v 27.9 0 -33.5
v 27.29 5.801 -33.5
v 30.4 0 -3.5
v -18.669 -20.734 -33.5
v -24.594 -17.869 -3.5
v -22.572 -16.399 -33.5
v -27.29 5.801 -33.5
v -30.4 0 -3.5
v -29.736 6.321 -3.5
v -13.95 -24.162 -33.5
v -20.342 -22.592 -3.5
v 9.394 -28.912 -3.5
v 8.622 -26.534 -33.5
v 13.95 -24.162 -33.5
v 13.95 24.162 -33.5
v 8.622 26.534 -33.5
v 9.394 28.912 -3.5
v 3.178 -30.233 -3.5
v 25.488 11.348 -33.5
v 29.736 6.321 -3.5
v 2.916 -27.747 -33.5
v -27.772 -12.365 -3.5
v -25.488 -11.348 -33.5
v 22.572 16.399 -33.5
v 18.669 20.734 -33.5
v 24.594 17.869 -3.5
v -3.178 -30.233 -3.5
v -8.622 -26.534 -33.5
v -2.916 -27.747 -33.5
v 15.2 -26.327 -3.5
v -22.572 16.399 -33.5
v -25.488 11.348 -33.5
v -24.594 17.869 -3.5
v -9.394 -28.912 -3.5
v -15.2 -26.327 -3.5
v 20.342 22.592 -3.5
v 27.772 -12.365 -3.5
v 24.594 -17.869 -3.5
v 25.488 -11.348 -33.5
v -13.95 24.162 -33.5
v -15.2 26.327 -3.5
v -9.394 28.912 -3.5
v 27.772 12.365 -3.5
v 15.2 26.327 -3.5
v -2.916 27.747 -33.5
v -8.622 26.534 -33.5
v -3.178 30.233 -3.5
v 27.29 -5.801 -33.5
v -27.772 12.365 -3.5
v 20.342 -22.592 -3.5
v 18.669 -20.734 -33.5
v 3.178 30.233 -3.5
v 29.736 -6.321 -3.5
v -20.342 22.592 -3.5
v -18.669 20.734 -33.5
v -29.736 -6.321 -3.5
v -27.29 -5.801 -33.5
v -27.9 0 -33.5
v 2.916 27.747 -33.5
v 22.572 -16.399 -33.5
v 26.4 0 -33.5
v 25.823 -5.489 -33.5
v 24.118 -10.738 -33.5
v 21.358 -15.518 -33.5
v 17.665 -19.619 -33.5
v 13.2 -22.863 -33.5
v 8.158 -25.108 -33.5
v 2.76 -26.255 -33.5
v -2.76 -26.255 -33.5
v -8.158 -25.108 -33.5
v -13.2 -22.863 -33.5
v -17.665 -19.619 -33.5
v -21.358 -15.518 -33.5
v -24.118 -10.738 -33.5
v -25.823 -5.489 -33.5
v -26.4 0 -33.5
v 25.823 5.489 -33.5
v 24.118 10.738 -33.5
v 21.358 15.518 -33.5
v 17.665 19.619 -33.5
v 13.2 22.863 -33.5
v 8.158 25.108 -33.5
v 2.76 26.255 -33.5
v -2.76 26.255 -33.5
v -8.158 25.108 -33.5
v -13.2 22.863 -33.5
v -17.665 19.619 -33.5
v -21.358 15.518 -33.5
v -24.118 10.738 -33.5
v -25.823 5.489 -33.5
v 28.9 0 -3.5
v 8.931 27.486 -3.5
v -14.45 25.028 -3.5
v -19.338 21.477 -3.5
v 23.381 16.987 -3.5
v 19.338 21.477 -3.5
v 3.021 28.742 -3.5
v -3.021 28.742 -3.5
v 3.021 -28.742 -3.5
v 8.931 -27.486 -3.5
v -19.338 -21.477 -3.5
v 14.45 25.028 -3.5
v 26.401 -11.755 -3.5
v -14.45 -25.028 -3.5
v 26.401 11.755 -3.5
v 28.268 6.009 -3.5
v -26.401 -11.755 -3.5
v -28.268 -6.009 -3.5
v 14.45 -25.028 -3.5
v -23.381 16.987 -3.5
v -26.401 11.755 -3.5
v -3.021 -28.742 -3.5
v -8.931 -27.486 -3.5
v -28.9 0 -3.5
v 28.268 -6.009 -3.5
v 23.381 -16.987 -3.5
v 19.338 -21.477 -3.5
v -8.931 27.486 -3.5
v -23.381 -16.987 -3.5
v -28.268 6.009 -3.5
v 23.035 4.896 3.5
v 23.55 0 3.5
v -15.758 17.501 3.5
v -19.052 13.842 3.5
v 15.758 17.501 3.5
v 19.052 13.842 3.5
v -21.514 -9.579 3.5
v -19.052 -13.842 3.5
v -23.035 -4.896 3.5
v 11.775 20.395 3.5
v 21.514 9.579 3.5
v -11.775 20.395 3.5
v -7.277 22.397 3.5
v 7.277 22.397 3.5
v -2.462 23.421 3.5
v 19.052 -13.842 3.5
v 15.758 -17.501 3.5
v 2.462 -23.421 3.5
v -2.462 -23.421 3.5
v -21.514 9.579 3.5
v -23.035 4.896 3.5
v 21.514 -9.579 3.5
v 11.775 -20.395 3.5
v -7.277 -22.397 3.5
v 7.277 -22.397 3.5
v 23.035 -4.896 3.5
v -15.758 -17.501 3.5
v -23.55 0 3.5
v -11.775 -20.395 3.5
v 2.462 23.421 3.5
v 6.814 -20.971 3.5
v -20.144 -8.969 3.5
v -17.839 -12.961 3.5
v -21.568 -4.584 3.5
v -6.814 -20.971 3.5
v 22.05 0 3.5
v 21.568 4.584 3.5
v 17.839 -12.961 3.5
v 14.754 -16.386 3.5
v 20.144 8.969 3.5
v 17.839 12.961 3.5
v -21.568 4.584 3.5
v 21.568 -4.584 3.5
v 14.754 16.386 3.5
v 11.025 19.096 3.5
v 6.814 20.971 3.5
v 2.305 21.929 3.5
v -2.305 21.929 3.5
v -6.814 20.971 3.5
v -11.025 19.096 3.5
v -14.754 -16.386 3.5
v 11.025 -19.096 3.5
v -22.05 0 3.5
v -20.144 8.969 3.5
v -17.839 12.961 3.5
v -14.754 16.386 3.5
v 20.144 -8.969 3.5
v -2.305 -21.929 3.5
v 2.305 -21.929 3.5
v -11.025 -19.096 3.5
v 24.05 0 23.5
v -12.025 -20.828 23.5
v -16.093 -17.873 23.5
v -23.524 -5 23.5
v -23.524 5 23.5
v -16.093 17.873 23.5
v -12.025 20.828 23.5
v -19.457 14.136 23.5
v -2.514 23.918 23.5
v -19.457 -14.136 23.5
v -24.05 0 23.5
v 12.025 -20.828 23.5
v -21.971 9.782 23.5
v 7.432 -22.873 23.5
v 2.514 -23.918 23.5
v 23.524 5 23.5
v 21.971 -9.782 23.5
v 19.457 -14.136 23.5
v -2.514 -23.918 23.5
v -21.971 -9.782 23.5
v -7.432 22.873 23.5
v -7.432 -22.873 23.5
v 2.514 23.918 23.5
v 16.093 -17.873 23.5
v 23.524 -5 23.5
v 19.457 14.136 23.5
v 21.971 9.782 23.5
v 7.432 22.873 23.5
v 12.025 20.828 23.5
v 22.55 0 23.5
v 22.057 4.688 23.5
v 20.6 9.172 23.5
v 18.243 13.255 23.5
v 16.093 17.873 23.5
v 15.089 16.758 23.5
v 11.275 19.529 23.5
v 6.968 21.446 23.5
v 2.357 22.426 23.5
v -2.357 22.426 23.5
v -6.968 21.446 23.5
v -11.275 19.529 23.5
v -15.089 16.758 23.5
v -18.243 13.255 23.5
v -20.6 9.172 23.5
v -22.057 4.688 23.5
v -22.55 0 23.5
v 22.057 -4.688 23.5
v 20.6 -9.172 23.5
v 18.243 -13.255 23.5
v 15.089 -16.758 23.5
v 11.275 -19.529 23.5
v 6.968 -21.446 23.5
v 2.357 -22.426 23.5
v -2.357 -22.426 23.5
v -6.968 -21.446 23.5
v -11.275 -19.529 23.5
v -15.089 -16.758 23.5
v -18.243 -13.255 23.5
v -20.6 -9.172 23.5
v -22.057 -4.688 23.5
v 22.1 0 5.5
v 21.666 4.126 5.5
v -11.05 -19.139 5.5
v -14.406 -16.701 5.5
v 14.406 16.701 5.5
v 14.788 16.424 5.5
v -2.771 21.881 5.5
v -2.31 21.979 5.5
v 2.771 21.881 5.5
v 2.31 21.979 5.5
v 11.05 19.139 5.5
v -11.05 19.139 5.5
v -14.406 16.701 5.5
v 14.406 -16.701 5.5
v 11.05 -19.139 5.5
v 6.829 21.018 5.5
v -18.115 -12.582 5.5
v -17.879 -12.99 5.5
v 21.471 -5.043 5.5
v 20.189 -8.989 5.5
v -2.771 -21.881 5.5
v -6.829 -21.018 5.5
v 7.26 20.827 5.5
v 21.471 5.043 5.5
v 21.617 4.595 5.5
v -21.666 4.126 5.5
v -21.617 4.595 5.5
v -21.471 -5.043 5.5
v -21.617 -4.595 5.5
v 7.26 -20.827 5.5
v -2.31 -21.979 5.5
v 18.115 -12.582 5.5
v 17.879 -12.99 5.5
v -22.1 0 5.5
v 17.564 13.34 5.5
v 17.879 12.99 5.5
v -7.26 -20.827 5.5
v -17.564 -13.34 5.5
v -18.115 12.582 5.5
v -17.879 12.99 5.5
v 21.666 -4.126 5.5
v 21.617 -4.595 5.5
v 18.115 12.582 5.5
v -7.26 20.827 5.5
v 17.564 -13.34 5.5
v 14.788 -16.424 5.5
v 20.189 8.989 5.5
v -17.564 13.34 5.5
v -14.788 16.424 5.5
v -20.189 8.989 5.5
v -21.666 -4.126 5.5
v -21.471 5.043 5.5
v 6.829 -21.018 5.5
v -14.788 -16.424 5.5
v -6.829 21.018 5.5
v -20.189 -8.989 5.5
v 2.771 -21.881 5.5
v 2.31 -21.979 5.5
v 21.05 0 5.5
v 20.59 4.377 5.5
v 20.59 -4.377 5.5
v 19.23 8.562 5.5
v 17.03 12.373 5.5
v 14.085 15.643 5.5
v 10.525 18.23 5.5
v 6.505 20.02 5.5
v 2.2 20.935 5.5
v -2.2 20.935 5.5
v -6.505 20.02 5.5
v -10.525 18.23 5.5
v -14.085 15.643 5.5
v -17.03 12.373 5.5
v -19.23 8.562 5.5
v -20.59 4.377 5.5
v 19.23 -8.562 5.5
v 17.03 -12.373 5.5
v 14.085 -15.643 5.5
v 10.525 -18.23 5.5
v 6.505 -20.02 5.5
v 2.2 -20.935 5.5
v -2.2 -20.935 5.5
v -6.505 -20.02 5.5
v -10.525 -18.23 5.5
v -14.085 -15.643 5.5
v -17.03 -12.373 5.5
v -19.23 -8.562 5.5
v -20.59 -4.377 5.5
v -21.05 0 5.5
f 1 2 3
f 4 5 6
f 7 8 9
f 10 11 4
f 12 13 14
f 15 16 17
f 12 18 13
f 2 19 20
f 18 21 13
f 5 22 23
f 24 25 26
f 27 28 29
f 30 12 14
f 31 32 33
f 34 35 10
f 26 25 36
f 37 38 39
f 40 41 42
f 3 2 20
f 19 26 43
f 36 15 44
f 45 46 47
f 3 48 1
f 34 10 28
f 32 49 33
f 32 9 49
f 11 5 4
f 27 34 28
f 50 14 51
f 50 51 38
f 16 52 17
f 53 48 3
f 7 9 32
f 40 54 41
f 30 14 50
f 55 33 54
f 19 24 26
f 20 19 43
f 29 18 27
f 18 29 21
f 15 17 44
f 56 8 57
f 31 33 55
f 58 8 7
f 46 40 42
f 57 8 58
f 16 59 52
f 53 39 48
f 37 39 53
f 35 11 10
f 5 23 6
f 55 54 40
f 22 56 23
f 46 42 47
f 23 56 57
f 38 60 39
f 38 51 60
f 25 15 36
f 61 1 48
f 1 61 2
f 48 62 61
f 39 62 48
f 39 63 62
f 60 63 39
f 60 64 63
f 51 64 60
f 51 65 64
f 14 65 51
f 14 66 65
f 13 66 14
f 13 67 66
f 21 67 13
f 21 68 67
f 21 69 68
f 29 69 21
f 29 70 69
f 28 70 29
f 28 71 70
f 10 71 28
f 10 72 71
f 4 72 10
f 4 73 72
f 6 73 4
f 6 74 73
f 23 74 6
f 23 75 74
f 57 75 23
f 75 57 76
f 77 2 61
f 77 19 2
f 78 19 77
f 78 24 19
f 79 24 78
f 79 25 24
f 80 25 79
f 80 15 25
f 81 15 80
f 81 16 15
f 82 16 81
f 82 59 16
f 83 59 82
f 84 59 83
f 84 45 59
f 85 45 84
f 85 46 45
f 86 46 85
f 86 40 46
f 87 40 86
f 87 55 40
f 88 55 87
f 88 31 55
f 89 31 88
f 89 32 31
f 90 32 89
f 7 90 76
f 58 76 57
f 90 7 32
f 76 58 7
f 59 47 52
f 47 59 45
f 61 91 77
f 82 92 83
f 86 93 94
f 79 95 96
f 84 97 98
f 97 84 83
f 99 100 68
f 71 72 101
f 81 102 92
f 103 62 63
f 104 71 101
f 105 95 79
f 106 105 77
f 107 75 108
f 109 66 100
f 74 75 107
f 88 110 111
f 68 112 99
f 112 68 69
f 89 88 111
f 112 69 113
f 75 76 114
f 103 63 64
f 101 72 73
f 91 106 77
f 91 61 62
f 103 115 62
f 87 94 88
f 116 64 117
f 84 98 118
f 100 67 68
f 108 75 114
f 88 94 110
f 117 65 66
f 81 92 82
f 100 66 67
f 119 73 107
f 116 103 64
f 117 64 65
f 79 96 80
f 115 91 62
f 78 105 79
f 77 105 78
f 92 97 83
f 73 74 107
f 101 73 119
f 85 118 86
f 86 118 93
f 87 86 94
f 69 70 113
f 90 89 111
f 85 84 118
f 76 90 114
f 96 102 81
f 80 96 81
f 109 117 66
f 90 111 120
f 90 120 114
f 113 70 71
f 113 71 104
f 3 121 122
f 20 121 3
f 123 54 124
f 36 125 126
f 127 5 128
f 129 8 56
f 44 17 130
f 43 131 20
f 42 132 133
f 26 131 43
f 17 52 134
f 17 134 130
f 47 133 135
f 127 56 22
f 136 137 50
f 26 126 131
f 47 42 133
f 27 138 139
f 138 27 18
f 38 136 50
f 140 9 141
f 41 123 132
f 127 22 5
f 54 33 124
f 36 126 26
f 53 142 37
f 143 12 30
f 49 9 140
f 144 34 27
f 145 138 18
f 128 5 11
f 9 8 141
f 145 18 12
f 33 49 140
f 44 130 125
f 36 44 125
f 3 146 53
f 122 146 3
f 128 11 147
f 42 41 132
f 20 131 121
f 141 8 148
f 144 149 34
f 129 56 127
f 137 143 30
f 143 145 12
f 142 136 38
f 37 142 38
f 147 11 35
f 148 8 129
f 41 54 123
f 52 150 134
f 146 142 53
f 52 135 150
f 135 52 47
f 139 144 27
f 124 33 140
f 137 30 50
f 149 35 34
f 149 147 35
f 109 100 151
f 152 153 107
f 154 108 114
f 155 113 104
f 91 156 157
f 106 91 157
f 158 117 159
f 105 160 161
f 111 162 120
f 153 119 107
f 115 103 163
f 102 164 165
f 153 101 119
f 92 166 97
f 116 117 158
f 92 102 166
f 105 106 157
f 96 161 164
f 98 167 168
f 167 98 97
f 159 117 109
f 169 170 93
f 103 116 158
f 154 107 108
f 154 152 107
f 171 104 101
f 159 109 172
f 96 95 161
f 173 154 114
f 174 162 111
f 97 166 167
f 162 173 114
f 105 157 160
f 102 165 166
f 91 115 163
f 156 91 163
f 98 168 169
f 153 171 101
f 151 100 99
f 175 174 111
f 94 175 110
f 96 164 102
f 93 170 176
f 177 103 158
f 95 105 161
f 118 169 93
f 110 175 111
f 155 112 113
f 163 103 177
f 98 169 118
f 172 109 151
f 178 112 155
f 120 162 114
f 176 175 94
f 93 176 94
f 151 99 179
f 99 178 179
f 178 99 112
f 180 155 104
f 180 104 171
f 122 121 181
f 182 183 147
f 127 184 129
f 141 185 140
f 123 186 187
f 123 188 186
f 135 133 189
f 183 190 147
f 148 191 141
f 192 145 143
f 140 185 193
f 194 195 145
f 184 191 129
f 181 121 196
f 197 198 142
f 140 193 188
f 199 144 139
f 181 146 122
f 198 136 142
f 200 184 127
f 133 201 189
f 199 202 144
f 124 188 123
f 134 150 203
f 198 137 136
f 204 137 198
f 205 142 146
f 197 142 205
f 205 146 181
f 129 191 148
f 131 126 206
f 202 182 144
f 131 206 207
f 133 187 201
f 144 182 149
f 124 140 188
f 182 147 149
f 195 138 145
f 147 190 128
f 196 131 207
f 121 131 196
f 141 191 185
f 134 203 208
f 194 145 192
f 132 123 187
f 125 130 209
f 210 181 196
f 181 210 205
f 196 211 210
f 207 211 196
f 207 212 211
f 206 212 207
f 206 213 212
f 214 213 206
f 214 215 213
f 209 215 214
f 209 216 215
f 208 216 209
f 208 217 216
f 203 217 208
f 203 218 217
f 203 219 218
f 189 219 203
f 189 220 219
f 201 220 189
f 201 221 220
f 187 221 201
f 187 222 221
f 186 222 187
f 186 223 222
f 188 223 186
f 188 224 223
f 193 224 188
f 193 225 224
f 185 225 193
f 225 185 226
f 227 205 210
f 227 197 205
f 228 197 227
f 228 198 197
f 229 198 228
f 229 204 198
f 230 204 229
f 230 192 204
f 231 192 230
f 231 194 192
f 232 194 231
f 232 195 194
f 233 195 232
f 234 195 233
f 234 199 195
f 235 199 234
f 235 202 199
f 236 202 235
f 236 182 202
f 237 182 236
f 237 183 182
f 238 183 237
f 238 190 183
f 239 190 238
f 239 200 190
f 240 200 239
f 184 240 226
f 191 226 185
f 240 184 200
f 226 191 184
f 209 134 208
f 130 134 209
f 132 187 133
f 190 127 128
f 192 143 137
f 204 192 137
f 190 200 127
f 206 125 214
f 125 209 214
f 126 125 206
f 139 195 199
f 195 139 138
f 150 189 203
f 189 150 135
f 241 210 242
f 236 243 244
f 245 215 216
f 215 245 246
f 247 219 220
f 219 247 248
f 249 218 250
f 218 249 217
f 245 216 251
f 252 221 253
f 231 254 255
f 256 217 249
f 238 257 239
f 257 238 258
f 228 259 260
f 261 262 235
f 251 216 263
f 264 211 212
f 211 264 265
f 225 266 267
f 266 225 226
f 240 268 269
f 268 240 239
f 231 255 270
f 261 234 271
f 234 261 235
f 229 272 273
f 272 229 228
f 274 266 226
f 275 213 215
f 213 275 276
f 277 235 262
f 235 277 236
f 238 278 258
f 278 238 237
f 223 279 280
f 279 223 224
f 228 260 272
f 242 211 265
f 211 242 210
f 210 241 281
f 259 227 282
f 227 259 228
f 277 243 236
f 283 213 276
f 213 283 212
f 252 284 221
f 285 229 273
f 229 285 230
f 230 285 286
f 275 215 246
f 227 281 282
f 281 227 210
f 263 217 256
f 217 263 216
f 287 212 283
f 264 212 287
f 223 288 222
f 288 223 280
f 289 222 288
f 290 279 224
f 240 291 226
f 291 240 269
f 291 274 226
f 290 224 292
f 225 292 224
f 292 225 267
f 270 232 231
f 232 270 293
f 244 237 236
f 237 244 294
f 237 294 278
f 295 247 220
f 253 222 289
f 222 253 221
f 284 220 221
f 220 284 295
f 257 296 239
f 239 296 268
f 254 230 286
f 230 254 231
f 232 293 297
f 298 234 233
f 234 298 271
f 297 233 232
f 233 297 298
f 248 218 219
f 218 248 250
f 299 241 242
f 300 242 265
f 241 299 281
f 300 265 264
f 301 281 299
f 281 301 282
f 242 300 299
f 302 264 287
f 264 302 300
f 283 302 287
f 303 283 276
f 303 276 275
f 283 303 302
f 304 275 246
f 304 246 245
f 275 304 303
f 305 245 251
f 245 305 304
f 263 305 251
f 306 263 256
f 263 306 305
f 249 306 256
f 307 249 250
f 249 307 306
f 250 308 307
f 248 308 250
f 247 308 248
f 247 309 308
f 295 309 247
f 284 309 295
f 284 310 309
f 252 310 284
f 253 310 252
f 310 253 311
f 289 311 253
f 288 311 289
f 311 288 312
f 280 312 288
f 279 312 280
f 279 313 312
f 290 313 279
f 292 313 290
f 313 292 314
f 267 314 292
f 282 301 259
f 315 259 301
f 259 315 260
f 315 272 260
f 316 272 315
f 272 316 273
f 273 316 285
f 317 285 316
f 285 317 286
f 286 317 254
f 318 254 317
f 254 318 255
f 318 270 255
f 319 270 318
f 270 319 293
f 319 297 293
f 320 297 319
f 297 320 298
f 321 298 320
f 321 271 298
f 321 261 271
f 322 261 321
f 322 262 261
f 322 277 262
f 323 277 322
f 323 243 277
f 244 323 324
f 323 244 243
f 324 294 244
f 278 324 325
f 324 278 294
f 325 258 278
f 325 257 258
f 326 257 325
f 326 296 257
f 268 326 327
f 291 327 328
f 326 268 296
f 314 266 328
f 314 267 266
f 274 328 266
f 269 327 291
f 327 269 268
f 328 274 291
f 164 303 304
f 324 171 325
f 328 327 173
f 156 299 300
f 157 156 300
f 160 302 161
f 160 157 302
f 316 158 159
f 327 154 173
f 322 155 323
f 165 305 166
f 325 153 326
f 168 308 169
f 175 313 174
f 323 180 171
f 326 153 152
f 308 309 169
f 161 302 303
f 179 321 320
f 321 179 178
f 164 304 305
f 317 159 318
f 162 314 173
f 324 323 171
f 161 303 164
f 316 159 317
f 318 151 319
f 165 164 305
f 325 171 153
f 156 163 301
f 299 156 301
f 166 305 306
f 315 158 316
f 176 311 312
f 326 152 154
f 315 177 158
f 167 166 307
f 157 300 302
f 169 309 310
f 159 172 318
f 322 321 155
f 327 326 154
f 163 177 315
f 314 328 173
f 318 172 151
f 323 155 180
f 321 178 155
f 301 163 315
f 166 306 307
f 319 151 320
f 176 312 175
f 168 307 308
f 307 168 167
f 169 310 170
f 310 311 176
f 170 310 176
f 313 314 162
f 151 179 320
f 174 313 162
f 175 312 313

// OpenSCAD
tolerance = .4;
rVac = 44.3/2 + tolerance;
rPlaner = 58/2 + tolerance;
thickness = 1.5;
taper = .5;
hTransition = 7;
hAdapter = 20;
hBottomAdapter = 30;

// bottom
translate([0,0,-(hBottomAdapter+hTransition)/2]) {
    difference() {
        cylinder(h = hBottomAdapter, r1 = rPlaner+thickness-3, r2 = rPlaner+thickness-taper, center = true);
        cylinder(h = hBottomAdapter, r1 = rPlaner-3, r2 = rPlaner-taper, center = true);
    };
}

// transition
difference() {
    cylinder(h = hTransition, r1 = rPlaner+thickness-taper, r2 = rVac+thickness-taper, center = true);
    cylinder(h = hTransition, r1 = rPlaner-taper, r2 = rVac-taper, center = true);
};

// top
translate([0,0,(hAdapter+hTransition)/2]) {
    difference() {
        cylinder(h = hAdapter, r1 = rVac+thickness-taper, r2 = rVac+thickness, center = true);
        cylinder(h = hAdapter, r1 = rVac-taper, r2 = rVac, center = true);
    };
}
// stop ring
translate([0,0,hTransition/2+1]) {
    difference() {
        cylinder(h = 2, r1 = rVac+thickness-taper, r2 = rVac+thickness-taper, center = true);
        cylinder(h = 2, r1 = rVac-taper, r2 = rVac-taper-1, center = true);
    };
}
